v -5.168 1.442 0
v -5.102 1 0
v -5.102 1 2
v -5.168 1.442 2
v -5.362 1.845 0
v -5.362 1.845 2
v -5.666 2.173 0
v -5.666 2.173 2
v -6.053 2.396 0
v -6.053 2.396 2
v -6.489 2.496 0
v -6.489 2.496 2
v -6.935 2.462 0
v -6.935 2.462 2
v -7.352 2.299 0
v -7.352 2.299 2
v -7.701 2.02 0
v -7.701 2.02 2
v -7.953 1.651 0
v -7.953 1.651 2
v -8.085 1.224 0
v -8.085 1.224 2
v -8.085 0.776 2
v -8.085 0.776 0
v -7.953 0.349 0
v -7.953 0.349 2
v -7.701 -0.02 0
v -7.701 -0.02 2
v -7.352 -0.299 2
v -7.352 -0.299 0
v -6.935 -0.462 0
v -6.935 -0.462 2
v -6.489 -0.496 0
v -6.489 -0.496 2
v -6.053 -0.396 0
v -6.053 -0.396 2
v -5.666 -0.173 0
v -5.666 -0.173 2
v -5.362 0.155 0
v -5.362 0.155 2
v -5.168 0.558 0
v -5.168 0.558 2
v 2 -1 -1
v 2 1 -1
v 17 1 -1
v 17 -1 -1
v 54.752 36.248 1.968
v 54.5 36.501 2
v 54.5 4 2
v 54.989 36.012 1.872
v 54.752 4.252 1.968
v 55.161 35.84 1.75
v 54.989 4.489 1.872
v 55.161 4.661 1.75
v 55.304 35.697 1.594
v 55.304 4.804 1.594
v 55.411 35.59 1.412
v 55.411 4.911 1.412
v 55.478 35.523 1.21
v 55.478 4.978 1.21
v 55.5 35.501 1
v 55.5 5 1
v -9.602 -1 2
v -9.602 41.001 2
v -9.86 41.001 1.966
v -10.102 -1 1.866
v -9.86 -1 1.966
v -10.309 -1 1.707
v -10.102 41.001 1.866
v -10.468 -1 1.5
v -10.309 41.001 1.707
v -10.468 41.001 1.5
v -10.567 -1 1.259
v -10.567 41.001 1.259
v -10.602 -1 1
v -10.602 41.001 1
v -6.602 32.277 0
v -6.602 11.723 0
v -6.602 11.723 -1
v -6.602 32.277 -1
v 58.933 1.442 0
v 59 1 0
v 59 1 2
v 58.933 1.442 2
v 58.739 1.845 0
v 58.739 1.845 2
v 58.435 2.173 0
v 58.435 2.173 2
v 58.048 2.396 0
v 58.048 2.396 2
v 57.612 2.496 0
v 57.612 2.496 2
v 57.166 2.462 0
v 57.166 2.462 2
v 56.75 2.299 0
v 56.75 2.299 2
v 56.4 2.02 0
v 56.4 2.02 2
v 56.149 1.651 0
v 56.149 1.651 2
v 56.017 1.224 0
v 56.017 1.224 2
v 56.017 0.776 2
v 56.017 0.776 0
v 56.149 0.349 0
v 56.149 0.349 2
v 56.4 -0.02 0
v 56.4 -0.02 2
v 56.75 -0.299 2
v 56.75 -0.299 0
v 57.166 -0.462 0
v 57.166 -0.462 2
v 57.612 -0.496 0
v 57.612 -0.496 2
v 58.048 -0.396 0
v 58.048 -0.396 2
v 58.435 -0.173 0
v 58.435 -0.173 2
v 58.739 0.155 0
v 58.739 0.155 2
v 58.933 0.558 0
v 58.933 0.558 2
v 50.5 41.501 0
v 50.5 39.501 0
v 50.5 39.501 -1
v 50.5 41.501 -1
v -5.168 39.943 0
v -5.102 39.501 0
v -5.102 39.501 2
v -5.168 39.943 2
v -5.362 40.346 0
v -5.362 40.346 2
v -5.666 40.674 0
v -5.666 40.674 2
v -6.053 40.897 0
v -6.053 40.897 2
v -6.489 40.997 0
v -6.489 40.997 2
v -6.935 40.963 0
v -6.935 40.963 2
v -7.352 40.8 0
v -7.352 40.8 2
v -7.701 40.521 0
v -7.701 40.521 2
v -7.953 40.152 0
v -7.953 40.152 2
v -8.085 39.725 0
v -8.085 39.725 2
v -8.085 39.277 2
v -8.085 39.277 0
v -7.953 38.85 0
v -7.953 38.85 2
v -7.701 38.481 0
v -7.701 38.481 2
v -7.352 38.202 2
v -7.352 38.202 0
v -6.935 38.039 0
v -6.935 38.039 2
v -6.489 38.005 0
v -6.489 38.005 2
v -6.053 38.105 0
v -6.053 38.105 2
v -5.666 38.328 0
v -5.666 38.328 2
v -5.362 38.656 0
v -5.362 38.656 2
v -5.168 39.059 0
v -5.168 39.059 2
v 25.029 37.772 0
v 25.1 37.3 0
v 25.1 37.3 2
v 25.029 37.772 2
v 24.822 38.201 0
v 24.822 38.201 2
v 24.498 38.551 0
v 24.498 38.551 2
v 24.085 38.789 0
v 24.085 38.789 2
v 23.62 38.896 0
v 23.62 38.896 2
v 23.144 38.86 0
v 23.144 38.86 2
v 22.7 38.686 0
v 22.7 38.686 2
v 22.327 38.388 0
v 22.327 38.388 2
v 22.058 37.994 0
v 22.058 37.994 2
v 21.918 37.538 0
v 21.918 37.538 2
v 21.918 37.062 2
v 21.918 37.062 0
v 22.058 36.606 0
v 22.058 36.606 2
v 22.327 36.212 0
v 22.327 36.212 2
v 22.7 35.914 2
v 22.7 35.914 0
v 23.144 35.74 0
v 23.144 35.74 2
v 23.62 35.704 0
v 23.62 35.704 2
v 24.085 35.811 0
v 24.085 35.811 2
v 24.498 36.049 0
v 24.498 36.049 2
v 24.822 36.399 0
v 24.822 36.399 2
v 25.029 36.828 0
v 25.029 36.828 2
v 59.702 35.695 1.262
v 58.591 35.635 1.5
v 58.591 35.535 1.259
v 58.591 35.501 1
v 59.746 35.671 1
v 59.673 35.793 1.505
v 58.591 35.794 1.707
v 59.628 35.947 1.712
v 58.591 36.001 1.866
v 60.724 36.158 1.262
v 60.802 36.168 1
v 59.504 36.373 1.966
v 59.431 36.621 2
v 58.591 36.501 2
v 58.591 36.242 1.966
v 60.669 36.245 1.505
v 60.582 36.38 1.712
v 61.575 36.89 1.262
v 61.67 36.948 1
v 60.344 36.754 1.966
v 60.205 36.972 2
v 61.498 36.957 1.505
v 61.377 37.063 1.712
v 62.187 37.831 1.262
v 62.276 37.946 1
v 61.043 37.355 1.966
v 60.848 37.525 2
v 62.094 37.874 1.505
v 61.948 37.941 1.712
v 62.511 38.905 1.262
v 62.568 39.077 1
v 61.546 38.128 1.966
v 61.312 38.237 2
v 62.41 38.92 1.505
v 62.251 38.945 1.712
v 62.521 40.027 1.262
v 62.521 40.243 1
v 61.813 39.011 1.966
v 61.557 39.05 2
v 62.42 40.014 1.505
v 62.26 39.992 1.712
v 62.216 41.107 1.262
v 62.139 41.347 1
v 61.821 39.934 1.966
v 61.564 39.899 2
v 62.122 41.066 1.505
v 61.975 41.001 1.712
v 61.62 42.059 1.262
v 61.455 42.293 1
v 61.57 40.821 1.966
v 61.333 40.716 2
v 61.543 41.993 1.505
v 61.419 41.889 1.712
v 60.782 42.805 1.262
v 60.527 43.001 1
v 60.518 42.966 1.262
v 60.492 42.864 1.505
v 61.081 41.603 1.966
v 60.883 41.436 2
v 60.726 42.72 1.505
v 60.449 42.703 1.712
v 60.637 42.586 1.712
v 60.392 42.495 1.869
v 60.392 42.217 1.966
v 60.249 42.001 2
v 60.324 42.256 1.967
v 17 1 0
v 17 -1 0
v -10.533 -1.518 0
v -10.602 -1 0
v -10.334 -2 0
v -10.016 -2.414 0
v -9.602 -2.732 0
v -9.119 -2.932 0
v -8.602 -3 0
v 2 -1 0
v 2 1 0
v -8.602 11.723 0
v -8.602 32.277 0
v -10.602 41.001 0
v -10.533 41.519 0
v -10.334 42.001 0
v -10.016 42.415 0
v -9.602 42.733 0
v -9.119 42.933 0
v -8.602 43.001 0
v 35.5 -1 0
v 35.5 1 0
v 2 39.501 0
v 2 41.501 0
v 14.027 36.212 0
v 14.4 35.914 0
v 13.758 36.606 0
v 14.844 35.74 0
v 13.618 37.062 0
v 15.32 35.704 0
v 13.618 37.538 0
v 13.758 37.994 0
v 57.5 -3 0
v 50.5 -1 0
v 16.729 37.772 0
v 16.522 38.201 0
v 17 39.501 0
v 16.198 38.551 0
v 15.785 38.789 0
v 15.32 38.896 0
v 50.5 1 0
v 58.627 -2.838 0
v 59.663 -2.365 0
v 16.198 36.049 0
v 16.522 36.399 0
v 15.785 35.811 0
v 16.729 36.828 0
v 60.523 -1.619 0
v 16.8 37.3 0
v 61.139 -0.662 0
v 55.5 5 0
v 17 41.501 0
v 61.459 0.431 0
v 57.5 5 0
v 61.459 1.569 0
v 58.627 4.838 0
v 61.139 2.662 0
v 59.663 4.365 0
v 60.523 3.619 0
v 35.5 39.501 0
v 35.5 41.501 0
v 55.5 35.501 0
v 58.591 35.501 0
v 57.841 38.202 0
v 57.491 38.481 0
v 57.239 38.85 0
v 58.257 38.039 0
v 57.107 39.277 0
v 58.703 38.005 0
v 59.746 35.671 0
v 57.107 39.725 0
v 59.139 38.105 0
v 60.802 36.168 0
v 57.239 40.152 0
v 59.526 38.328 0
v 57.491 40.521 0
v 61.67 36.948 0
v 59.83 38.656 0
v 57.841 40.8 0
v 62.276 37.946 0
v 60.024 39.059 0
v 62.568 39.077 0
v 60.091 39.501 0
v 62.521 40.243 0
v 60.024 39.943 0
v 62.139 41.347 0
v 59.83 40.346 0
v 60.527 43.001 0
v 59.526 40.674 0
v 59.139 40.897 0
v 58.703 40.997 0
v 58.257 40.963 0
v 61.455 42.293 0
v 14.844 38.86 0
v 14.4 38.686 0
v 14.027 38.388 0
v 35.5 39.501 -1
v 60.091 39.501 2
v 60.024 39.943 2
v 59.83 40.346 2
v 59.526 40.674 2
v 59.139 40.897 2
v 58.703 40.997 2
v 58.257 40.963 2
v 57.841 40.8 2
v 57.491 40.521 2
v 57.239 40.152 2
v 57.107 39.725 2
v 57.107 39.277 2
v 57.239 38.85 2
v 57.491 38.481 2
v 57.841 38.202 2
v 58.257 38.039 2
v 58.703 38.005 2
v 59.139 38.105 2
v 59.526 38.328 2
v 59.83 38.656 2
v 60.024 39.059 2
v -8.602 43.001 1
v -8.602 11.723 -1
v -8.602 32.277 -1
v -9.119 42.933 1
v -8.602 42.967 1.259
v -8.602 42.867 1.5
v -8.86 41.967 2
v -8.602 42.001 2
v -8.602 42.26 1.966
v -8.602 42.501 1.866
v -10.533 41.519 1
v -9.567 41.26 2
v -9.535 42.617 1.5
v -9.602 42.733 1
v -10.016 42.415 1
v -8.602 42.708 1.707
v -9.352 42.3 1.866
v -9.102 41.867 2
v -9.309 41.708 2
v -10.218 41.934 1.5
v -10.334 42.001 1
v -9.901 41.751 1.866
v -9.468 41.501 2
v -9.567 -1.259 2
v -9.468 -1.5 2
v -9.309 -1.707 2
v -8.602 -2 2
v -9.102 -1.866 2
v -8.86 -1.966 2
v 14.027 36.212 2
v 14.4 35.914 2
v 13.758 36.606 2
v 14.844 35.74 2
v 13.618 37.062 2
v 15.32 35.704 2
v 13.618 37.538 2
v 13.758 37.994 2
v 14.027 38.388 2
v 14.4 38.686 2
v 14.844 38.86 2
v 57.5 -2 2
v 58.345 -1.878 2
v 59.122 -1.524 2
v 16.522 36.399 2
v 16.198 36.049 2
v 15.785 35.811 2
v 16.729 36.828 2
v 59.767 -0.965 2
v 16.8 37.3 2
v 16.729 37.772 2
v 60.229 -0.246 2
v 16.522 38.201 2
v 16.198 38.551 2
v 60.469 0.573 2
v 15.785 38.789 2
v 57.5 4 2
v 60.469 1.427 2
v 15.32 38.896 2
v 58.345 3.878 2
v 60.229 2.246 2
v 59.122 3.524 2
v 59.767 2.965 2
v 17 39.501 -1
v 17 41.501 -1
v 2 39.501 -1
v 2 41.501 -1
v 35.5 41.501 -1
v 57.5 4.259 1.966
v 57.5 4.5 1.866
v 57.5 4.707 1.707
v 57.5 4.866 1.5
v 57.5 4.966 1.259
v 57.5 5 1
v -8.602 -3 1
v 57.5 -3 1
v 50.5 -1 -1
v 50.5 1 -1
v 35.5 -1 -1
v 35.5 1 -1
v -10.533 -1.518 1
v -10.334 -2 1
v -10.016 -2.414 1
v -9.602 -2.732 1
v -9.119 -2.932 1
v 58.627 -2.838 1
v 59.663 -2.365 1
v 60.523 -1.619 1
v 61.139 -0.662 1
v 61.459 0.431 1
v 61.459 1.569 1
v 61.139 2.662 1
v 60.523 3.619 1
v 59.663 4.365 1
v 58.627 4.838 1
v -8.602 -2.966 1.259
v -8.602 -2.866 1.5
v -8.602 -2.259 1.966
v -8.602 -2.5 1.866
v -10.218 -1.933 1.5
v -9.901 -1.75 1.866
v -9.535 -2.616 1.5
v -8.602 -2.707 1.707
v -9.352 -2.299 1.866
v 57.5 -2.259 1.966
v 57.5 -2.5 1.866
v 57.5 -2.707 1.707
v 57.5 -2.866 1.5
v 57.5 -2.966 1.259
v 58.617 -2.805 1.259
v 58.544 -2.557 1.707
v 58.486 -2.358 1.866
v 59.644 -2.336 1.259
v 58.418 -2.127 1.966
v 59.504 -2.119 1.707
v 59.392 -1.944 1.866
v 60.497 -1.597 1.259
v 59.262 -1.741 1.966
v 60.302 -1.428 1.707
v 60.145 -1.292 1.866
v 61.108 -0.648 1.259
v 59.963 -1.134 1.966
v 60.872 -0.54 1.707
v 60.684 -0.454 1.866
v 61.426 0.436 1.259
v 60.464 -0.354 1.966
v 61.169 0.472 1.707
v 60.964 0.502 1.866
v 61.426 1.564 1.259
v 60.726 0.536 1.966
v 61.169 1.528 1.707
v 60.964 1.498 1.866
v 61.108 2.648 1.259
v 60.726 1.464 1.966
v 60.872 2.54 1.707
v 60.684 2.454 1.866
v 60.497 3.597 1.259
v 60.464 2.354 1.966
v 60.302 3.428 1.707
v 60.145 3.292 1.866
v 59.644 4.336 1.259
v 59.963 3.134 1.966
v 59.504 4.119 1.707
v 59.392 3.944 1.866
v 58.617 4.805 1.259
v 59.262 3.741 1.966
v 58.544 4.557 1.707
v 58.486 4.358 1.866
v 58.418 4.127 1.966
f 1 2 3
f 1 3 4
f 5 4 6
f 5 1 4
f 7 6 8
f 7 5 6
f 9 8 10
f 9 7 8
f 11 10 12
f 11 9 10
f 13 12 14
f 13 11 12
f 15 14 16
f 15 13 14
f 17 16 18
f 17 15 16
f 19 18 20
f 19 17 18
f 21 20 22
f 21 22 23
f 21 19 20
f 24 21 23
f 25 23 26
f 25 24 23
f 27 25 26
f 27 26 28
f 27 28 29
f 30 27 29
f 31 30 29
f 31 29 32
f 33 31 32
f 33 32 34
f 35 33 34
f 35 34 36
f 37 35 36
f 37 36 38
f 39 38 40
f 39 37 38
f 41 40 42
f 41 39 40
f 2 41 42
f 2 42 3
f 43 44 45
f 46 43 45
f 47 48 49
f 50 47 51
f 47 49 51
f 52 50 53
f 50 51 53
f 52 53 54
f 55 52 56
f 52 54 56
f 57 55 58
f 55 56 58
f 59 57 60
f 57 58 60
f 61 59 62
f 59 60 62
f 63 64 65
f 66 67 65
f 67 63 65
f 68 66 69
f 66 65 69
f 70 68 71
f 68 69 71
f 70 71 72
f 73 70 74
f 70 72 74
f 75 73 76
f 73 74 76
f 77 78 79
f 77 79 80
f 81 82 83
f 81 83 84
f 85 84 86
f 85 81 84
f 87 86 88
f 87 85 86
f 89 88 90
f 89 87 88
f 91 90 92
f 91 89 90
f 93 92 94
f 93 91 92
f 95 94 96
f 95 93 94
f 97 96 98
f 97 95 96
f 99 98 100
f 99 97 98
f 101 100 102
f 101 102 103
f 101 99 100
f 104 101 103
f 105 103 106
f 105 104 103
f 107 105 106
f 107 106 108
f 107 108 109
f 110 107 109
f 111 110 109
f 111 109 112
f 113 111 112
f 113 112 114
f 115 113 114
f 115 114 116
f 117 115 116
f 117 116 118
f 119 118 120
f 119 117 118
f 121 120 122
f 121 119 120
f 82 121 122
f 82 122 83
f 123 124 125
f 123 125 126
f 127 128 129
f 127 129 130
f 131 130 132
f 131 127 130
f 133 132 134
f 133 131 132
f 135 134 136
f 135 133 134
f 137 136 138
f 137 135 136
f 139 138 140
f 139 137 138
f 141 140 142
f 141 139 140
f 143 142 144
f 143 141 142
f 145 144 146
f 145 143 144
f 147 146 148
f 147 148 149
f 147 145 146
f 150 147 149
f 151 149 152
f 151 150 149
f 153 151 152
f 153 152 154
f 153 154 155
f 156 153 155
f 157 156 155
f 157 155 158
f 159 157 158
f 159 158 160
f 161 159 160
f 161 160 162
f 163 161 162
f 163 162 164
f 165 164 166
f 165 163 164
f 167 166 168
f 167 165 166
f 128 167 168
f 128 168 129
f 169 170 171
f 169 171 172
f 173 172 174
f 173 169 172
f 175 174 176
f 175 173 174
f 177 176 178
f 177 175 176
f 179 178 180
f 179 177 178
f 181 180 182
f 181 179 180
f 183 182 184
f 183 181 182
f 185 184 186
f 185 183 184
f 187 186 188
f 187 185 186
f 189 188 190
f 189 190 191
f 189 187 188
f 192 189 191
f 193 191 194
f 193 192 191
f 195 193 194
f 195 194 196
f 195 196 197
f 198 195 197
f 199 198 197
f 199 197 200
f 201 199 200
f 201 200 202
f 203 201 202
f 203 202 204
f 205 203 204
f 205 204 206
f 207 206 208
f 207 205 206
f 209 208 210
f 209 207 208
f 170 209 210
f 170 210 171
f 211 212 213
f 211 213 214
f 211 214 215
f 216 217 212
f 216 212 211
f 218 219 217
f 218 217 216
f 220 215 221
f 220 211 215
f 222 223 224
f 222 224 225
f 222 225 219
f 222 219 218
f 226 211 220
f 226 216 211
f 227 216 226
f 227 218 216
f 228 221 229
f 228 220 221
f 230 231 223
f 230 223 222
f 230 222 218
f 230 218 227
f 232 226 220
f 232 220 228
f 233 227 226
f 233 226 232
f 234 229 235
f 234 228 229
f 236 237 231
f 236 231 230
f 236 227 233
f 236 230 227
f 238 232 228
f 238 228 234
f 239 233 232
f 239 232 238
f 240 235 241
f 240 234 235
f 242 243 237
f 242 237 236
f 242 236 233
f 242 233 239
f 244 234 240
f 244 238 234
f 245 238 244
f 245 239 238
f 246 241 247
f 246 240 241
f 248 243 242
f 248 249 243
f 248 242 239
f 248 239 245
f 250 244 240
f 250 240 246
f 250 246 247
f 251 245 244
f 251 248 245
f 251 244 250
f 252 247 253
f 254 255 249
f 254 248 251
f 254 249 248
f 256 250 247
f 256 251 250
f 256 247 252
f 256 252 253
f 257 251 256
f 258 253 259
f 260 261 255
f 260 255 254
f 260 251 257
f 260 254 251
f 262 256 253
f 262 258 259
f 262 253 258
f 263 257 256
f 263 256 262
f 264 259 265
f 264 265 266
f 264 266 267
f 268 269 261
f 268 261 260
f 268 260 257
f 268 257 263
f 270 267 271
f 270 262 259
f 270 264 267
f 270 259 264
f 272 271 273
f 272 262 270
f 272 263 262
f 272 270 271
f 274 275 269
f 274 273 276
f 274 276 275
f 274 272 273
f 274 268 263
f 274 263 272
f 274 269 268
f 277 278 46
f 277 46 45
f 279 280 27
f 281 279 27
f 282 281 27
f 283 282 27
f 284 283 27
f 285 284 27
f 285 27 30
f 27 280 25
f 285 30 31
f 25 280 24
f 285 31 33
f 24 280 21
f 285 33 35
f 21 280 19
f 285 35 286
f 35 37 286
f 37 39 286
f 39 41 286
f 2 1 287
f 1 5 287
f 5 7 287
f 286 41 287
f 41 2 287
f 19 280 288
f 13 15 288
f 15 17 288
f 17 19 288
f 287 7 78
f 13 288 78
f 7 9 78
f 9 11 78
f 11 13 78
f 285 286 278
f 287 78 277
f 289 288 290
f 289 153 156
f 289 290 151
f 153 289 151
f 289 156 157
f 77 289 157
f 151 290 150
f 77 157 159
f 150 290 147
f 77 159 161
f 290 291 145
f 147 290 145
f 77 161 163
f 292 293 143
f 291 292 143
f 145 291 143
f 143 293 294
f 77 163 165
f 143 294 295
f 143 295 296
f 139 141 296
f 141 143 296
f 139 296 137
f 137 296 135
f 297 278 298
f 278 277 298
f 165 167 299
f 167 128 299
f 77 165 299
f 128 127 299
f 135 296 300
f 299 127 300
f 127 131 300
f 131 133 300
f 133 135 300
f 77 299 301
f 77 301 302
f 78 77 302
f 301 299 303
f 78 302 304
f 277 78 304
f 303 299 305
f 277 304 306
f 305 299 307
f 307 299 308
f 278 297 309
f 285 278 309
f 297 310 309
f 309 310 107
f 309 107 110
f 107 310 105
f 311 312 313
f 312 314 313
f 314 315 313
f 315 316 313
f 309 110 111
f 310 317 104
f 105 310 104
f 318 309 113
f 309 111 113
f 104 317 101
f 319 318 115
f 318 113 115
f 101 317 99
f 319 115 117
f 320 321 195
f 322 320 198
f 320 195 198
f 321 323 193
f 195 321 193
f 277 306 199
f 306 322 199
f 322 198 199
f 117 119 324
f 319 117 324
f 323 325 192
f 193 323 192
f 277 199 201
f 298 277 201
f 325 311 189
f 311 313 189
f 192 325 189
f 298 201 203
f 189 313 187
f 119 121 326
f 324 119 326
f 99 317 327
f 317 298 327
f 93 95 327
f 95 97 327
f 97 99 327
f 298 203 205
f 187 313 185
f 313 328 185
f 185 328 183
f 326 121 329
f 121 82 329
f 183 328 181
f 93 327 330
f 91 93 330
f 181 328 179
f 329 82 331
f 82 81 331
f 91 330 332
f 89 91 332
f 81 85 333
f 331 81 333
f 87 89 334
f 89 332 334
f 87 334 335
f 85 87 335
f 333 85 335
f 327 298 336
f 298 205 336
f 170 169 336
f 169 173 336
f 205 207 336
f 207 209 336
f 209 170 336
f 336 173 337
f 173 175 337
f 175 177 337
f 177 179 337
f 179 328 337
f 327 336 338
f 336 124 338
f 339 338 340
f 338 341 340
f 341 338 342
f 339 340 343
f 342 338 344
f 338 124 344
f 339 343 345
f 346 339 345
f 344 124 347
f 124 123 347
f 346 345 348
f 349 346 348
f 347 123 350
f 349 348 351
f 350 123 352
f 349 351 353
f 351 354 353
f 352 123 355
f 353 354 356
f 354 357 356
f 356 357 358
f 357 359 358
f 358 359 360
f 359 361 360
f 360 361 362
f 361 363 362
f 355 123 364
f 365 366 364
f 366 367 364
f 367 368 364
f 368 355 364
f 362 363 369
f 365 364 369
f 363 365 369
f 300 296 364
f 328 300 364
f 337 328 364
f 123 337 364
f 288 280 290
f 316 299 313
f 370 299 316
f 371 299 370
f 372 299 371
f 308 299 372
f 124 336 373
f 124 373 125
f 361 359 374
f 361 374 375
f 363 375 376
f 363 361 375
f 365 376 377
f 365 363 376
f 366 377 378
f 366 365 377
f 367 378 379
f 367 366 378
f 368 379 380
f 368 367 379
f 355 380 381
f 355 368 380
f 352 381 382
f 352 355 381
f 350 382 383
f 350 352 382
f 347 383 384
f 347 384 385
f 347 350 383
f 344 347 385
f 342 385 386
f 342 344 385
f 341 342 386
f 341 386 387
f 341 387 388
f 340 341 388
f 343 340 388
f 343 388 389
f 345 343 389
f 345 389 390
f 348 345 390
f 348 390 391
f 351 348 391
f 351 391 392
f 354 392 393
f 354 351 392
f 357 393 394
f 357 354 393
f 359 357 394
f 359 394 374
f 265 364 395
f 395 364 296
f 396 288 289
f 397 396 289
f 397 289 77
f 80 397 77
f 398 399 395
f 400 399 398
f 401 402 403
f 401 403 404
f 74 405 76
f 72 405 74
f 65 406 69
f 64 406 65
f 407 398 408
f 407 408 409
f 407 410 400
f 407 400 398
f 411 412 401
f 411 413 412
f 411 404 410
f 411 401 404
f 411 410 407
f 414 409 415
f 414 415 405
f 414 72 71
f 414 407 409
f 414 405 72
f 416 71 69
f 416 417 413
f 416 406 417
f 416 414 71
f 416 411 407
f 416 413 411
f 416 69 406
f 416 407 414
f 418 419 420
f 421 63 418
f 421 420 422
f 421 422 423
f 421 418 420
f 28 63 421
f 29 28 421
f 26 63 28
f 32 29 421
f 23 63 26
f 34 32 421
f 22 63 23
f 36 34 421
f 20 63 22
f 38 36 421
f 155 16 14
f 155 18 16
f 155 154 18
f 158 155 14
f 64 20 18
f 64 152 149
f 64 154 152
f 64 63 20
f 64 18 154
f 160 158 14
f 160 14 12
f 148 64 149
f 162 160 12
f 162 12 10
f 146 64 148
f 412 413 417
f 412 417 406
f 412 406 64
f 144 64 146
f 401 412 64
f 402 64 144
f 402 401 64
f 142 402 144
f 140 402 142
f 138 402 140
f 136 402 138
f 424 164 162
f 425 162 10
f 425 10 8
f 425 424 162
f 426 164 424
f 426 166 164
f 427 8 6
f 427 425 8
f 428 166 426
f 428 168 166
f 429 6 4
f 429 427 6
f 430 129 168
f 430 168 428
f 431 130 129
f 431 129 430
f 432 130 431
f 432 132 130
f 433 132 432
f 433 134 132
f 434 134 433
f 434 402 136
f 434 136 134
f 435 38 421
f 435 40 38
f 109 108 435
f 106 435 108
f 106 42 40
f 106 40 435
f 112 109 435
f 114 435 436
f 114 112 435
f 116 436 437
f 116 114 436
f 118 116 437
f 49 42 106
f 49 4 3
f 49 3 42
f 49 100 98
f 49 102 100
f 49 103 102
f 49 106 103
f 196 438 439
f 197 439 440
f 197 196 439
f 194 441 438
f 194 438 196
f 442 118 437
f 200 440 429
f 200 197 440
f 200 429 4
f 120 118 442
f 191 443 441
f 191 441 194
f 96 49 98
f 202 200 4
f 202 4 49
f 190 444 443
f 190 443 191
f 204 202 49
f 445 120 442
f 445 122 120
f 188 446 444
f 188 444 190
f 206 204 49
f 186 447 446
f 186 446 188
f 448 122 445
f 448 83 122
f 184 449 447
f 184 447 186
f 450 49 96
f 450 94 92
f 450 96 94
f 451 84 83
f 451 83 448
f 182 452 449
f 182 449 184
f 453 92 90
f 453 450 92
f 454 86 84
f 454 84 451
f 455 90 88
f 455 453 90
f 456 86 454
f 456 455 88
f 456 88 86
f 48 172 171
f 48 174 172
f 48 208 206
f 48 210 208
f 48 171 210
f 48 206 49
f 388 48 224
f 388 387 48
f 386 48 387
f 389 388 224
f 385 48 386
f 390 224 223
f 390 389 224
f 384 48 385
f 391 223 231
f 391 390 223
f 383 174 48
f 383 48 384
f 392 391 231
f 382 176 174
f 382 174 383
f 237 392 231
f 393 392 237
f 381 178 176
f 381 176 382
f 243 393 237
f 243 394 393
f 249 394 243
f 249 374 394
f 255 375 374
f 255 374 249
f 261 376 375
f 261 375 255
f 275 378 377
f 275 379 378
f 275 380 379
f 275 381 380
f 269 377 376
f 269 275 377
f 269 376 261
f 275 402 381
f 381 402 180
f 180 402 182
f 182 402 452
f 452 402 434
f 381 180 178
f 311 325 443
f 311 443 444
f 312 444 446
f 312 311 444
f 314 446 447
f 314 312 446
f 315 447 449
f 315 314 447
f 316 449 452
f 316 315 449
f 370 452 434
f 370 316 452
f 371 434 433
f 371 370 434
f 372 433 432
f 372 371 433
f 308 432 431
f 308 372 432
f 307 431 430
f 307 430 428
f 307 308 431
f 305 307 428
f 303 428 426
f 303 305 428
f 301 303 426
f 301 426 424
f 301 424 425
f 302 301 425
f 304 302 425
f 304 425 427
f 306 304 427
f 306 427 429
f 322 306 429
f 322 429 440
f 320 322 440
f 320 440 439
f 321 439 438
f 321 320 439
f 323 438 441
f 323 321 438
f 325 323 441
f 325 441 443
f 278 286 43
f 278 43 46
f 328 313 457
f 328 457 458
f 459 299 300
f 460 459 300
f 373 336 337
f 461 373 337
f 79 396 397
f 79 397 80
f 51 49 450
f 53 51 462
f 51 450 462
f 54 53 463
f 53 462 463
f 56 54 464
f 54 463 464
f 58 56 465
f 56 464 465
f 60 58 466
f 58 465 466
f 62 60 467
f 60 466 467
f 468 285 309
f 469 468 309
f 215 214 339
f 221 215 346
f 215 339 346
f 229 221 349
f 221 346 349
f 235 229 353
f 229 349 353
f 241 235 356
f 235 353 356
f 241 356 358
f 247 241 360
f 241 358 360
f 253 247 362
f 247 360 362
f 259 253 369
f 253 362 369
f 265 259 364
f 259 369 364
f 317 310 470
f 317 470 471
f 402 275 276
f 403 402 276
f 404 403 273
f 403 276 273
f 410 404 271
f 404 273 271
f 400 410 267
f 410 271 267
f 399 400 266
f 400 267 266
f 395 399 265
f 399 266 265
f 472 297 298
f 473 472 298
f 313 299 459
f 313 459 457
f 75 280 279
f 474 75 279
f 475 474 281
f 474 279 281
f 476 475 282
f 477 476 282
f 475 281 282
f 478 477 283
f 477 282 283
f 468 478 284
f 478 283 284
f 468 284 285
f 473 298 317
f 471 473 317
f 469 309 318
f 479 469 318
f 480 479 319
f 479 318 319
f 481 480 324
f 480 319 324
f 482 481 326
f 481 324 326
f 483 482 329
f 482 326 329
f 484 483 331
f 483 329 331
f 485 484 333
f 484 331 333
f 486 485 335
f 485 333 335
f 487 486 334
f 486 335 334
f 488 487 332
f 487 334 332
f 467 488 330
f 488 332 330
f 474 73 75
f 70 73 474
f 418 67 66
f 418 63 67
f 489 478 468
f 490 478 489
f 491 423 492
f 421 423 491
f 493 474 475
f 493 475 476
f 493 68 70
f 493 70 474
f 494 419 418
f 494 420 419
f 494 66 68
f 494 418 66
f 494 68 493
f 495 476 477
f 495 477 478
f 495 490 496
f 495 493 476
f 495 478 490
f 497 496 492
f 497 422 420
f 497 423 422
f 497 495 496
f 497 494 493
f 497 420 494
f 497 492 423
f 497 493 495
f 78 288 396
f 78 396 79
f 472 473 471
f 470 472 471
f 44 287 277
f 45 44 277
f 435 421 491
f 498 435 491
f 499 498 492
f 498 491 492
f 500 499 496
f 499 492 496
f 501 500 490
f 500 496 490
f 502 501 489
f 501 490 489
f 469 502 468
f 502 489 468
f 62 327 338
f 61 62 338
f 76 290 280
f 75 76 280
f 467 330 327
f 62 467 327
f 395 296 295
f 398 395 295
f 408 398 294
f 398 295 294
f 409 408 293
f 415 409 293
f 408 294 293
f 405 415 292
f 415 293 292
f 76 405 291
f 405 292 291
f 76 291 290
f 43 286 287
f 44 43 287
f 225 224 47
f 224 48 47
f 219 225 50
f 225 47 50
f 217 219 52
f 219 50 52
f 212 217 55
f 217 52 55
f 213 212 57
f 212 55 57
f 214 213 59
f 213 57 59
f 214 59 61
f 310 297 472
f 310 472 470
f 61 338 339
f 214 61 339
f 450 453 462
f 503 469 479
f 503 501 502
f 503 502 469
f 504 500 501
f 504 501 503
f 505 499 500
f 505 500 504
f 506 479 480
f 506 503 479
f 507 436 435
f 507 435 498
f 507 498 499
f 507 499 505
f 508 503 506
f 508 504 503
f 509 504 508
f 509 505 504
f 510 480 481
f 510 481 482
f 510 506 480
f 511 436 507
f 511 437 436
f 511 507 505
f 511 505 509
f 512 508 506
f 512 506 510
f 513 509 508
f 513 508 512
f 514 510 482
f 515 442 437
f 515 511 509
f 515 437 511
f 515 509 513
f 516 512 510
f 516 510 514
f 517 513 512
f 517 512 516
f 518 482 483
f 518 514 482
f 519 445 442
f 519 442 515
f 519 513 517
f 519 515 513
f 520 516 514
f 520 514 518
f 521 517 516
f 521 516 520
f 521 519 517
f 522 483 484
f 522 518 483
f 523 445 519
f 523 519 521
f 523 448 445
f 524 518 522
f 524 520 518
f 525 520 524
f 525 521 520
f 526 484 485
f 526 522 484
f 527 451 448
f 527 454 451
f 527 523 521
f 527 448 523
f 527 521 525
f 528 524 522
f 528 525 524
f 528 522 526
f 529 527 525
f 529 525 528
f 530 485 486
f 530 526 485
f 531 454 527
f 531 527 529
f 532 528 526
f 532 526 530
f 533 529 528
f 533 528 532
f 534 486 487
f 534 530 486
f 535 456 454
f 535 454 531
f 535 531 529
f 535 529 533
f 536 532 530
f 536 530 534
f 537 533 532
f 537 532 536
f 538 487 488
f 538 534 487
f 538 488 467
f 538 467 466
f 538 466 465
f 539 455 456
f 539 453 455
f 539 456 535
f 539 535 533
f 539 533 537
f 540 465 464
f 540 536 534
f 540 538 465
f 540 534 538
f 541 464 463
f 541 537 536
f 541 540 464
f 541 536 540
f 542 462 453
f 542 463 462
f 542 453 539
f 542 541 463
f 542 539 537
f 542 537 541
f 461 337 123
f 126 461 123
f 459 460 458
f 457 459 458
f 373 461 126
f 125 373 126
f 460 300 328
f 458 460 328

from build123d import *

# Parameters (mm, degrees)
SKETCH_2_R      = 1.5
SKETCH_2_R_2    = 1.6
EXTRUDE_1_DEPTH = 2
SKETCH_2_6_W    = 15
SKETCH_2_6_H    = 2
SKETCH_2_6_W_2  = 2
SKETCH_2_6_H_2  = 20.554974884
EXTRUDE_2_DEPTH = 1
FILLET_1_R      = 1


with BuildPart() as part:
    # 草图2 → 凸台-拉伸1 (new body)
    with BuildSketch(Plane.XY):
        with BuildLine():
            ThreePointArc((-10.601500464, -1), (-10.015714027, -2.414213562), (-8.601500464, -3))
            Line((-8.601500464, -3), (57.5, -3))
            ThreePointArc((57.5, -3), (61.5, 1), (57.5, 5))
            Line((57.5, 5), (55.5, 5))
            Line((55.5, 5), (55.5, 35.50095784))
            Line((55.5, 35.50095784), (58.590729836, 35.50095784))
            ThreePointArc((58.590729836, 35.50095784), (62.463713182, 38.50095784), (60.527221509, 43.00095784))
            Line((60.527221509, 43.00095784), (-8.601500464, 43.00095784))
            ThreePointArc((-8.601500464, 43.00095784), (-10.015714027, 42.415171403), (-10.601500464, 41.00095784))
            Line((-10.601500464, 41.00095784), (-10.601500464, -1))
        make_face()
        with Locations((-6.601500464, 1)):
            Circle(SKETCH_2_R, mode=Mode.SUBTRACT)
        with Locations((57.5, 1)):
            Circle(SKETCH_2_R, mode=Mode.SUBTRACT)
        with Locations((-6.601500464, 39.50095784)):
            Circle(SKETCH_2_R, mode=Mode.SUBTRACT)
        with Locations((15.2, 37.3)):
            Circle(SKETCH_2_R_2, mode=Mode.SUBTRACT)
        with Locations((23.5, 37.3)):
            Circle(SKETCH_2_R_2, mode=Mode.SUBTRACT)
        with Locations((58.590729836, 39.50095784)):
            Circle(SKETCH_2_R, mode=Mode.SUBTRACT)
    extrude(amount=EXTRUDE_1_DEPTH)

    # 草图2<6> → 凸台-拉伸2 (add)
    with BuildSketch(Plane.XY):
        with Locations((9.5, 40.50095784)):
            Rectangle(SKETCH_2_6_W, SKETCH_2_6_H)
        with Locations((-7.601500464, 22)):
            Rectangle(SKETCH_2_6_W_2, SKETCH_2_6_H_2)
        with Locations((43, 40.50095784)):
            Rectangle(SKETCH_2_6_W, SKETCH_2_6_H)
        with Locations((9.5, 0)):
            Rectangle(SKETCH_2_6_W, SKETCH_2_6_H)
        with Locations((43, 0)):
            Rectangle(SKETCH_2_6_W, SKETCH_2_6_H)
    extrude(amount=-EXTRUDE_2_DEPTH)

    # 圆角1
    # the kernel refuses this fillet: 1 mm, written as the material it takes off along each edge
    with BuildSketch(Plane(origin=(-8.601500464, -1, 2), x_dir=(-1, 0, 0), z_dir=(0, 1, 0))) as fillet_1_piece_1:
        with BuildLine():
            CenterArc((2 - FILLET_1_R, -FILLET_1_R), FILLET_1_R, 0, 90)
            Line((2 - FILLET_1_R, 0), (2, 0))
            Line((2, 0), (2, -FILLET_1_R))
        make_face()
    revolve(axis=Axis((-8.601500464, -1, 2), (0, 0, 1)), revolution_arc=90, mode=Mode.SUBTRACT)
    with BuildSketch(Plane(origin=(-8.601500464, -3, 2), x_dir=(0, 0, -1), z_dir=(1, 0, 0))) as fillet_1_piece_2:
        with BuildLine():
            CenterArc((FILLET_1_R, FILLET_1_R), FILLET_1_R, 180, 90)
            Line((0, FILLET_1_R), (0, 0))
            Line((0, 0), (FILLET_1_R, 0))
        make_face()
    extrude(amount=66.101500464, mode=Mode.SUBTRACT)
    with BuildSketch(Plane(origin=(57.5, 1, 2), x_dir=(0, -1, 0), z_dir=(-1, 0, 0))) as fillet_1_piece_3:
        with BuildLine():
            CenterArc((4 - FILLET_1_R, -FILLET_1_R), FILLET_1_R, 0, 90)
            Line((4, -FILLET_1_R), (4, 0))
            Line((4, 0), (4 - FILLET_1_R, 0))
        make_face()
    revolve(axis=Axis((57.5, 1, 2), (0, 0, 1)), revolution_arc=180, mode=Mode.SUBTRACT)
    with BuildSketch(Plane(origin=(57.5, 5, 2), x_dir=(0, -1, 0), z_dir=(-1, 0, 0))) as fillet_1_piece_4:
        with BuildLine():
            CenterArc((FILLET_1_R, -FILLET_1_R), FILLET_1_R, 90, 90)
            Line((0, -FILLET_1_R), (0, 0))
            Line((0, 0), (FILLET_1_R, 0))
        make_face()
    extrude(amount=2, mode=Mode.SUBTRACT)
    with BuildSketch(Plane(origin=(55.5, 5, 2), x_dir=(-1, 0, 0), z_dir=(0, 1, 0))) as fillet_1_piece_5:
        with BuildLine():
            CenterArc((FILLET_1_R, -FILLET_1_R), FILLET_1_R, 90, 90)
            Line((0, -FILLET_1_R), (0, 0))
            Line((0, 0), (FILLET_1_R, 0))
        make_face()
    extrude(amount=30.50095784, mode=Mode.SUBTRACT)
    with BuildSketch(Plane(origin=(55.5, 35.50095784, 2), x_dir=(0, 1, 0), z_dir=(1, 0, 0))) as fillet_1_piece_6:
        with BuildLine():
            CenterArc((FILLET_1_R, -FILLET_1_R), FILLET_1_R, 90, 90)
            Line((0, -FILLET_1_R), (0, 0))
            Line((0, 0), (FILLET_1_R, 0))
        make_face()
    extrude(amount=3.090729836, mode=Mode.SUBTRACT)
    with BuildSketch(Plane(origin=(58.590729836, 39.50095784, 2), x_dir=(0, -1, 0), z_dir=(-1, 0, 0))) as fillet_1_piece_7:
        with BuildLine():
            CenterArc((4 - FILLET_1_R, -FILLET_1_R), FILLET_1_R, 0, 90)
            Line((4, -FILLET_1_R), (4, 0))
            Line((4, 0), (4 - FILLET_1_R, 0))
        make_face()
    revolve(axis=Axis((58.590729836, 39.50095784, 2), (0, 0, 1)), revolution_arc=186.895375862, mode=Mode.SUBTRACT)
    with BuildSketch(Plane(origin=(63.027221509, 43.00095784, 2), x_dir=(0, -1, 0), z_dir=(-1, 0, 0))) as fillet_1_piece_8:
        with BuildLine():
            CenterArc((FILLET_1_R, -FILLET_1_R), FILLET_1_R, 90, 90)
            Line((0, -FILLET_1_R), (0, 0))
            Line((0, 0), (FILLET_1_R, 0))
        make_face()
    extrude(amount=71.628721973, mode=Mode.SUBTRACT)
    with BuildSketch(Plane(origin=(-8.601500464, 41.00095784, 2), x_dir=(0, 1, 0), z_dir=(1, 0, 0))) as fillet_1_piece_9:
        with BuildLine():
            CenterArc((2 - FILLET_1_R, -FILLET_1_R), FILLET_1_R, 0, 90)
            Line((2, -FILLET_1_R), (2, 0))
            Line((2, 0), (2 - FILLET_1_R, 0))
        make_face()
    revolve(axis=Axis((-8.601500464, 41.00095784, 2), (0, 0, 1)), revolution_arc=90, mode=Mode.SUBTRACT)
    with BuildSketch(Plane(origin=(-10.601500464, 41.00095784, 2), x_dir=(0, 0, -1), z_dir=(0, -1, 0))) as fillet_1_piece_10:
        with BuildLine():
            CenterArc((FILLET_1_R, FILLET_1_R), FILLET_1_R, 180, 90)
            Line((0, FILLET_1_R), (0, 0))
            Line((0, 0), (FILLET_1_R, 0))
        make_face()
    extrude(amount=42.00095784, mode=Mode.SUBTRACT)
    with BuildSketch(Plane(origin=(57.5, 5, 2), x_dir=(0, -1, 0), z_dir=(-1, 0, 0))) as fillet_1_piece_11a_section:
        with BuildLine():
            CenterArc((FILLET_1_R, -FILLET_1_R), FILLET_1_R, 90, 90)
            Line((0, -FILLET_1_R), (0, 0))
            Line((0, 0), (FILLET_1_R, 0))
        make_face()
    fillet_1_piece_11a = extrude(amount=4.5, mode=Mode.PRIVATE)
    fillet_1_piece_11a = split(fillet_1_piece_11a, bisect_by=Plane(origin=(55.5, 4.773604886, 1.773604886), z_dir=(-1, 0, 0)), keep=Keep.TOP, mode=Mode.PRIVATE)
    with BuildSketch(Plane(origin=(55.5, 2.5, 2), x_dir=(-1, 0, 0), z_dir=(0, 1, 0))) as fillet_1_piece_11b_section:
        with BuildLine():
            CenterArc((FILLET_1_R, -FILLET_1_R), FILLET_1_R, 90, 90)
            Line((0, -FILLET_1_R), (0, 0))
            Line((0, 0), (FILLET_1_R, 0))
        make_face()
    fillet_1_piece_11b = extrude(amount=33.00095784, mode=Mode.PRIVATE)
    fillet_1_piece_11b = split(fillet_1_piece_11b, bisect_by=Plane(origin=(55.273604886, 5, 1.773604886), z_dir=(0, -1, 0)), keep=Keep.TOP, mode=Mode.PRIVATE)
    fillet_1_piece_11 = fillet_1_piece_11a & fillet_1_piece_11b
    add(fillet_1_piece_11, mode=Mode.SUBTRACT)
    with BuildSketch(Plane(origin=(55.5, 5, 2), x_dir=(-1, 0, 0), z_dir=(0, 1, 0))) as fillet_1_piece_12a_section:
        with BuildLine():
            CenterArc((FILLET_1_R, -FILLET_1_R), FILLET_1_R, 90, 90)
            Line((0, -FILLET_1_R), (0, 0))
            Line((0, 0), (FILLET_1_R, 0))
        make_face()
    fillet_1_piece_12a = extrude(amount=33.00095784, mode=Mode.PRIVATE)
    fillet_1_piece_12a = split(fillet_1_piece_12a, bisect_by=Plane(origin=(55.273604886, 35.50095784, 1.773604886), z_dir=(0, 1, 0)), keep=Keep.TOP, mode=Mode.PRIVATE)
    with BuildSketch(Plane(origin=(53, 35.50095784, 2), x_dir=(0, 1, 0), z_dir=(1, 0, 0))) as fillet_1_piece_12b_section:
        with BuildLine():
            CenterArc((FILLET_1_R, -FILLET_1_R), FILLET_1_R, 90, 90)
            Line((0, -FILLET_1_R), (0, 0))
            Line((0, 0), (FILLET_1_R, 0))
        make_face()
    fillet_1_piece_12b = extrude(amount=5.590729836, mode=Mode.PRIVATE)
    fillet_1_piece_12b = split(fillet_1_piece_12b, bisect_by=Plane(origin=(55.5, 35.727352955, 1.773604886), z_dir=(-1, 0, 0)), keep=Keep.TOP, mode=Mode.PRIVATE)
    fillet_1_piece_12 = fillet_1_piece_12a & fillet_1_piece_12b
    add(fillet_1_piece_12, mode=Mode.SUBTRACT)


solid = part.part
